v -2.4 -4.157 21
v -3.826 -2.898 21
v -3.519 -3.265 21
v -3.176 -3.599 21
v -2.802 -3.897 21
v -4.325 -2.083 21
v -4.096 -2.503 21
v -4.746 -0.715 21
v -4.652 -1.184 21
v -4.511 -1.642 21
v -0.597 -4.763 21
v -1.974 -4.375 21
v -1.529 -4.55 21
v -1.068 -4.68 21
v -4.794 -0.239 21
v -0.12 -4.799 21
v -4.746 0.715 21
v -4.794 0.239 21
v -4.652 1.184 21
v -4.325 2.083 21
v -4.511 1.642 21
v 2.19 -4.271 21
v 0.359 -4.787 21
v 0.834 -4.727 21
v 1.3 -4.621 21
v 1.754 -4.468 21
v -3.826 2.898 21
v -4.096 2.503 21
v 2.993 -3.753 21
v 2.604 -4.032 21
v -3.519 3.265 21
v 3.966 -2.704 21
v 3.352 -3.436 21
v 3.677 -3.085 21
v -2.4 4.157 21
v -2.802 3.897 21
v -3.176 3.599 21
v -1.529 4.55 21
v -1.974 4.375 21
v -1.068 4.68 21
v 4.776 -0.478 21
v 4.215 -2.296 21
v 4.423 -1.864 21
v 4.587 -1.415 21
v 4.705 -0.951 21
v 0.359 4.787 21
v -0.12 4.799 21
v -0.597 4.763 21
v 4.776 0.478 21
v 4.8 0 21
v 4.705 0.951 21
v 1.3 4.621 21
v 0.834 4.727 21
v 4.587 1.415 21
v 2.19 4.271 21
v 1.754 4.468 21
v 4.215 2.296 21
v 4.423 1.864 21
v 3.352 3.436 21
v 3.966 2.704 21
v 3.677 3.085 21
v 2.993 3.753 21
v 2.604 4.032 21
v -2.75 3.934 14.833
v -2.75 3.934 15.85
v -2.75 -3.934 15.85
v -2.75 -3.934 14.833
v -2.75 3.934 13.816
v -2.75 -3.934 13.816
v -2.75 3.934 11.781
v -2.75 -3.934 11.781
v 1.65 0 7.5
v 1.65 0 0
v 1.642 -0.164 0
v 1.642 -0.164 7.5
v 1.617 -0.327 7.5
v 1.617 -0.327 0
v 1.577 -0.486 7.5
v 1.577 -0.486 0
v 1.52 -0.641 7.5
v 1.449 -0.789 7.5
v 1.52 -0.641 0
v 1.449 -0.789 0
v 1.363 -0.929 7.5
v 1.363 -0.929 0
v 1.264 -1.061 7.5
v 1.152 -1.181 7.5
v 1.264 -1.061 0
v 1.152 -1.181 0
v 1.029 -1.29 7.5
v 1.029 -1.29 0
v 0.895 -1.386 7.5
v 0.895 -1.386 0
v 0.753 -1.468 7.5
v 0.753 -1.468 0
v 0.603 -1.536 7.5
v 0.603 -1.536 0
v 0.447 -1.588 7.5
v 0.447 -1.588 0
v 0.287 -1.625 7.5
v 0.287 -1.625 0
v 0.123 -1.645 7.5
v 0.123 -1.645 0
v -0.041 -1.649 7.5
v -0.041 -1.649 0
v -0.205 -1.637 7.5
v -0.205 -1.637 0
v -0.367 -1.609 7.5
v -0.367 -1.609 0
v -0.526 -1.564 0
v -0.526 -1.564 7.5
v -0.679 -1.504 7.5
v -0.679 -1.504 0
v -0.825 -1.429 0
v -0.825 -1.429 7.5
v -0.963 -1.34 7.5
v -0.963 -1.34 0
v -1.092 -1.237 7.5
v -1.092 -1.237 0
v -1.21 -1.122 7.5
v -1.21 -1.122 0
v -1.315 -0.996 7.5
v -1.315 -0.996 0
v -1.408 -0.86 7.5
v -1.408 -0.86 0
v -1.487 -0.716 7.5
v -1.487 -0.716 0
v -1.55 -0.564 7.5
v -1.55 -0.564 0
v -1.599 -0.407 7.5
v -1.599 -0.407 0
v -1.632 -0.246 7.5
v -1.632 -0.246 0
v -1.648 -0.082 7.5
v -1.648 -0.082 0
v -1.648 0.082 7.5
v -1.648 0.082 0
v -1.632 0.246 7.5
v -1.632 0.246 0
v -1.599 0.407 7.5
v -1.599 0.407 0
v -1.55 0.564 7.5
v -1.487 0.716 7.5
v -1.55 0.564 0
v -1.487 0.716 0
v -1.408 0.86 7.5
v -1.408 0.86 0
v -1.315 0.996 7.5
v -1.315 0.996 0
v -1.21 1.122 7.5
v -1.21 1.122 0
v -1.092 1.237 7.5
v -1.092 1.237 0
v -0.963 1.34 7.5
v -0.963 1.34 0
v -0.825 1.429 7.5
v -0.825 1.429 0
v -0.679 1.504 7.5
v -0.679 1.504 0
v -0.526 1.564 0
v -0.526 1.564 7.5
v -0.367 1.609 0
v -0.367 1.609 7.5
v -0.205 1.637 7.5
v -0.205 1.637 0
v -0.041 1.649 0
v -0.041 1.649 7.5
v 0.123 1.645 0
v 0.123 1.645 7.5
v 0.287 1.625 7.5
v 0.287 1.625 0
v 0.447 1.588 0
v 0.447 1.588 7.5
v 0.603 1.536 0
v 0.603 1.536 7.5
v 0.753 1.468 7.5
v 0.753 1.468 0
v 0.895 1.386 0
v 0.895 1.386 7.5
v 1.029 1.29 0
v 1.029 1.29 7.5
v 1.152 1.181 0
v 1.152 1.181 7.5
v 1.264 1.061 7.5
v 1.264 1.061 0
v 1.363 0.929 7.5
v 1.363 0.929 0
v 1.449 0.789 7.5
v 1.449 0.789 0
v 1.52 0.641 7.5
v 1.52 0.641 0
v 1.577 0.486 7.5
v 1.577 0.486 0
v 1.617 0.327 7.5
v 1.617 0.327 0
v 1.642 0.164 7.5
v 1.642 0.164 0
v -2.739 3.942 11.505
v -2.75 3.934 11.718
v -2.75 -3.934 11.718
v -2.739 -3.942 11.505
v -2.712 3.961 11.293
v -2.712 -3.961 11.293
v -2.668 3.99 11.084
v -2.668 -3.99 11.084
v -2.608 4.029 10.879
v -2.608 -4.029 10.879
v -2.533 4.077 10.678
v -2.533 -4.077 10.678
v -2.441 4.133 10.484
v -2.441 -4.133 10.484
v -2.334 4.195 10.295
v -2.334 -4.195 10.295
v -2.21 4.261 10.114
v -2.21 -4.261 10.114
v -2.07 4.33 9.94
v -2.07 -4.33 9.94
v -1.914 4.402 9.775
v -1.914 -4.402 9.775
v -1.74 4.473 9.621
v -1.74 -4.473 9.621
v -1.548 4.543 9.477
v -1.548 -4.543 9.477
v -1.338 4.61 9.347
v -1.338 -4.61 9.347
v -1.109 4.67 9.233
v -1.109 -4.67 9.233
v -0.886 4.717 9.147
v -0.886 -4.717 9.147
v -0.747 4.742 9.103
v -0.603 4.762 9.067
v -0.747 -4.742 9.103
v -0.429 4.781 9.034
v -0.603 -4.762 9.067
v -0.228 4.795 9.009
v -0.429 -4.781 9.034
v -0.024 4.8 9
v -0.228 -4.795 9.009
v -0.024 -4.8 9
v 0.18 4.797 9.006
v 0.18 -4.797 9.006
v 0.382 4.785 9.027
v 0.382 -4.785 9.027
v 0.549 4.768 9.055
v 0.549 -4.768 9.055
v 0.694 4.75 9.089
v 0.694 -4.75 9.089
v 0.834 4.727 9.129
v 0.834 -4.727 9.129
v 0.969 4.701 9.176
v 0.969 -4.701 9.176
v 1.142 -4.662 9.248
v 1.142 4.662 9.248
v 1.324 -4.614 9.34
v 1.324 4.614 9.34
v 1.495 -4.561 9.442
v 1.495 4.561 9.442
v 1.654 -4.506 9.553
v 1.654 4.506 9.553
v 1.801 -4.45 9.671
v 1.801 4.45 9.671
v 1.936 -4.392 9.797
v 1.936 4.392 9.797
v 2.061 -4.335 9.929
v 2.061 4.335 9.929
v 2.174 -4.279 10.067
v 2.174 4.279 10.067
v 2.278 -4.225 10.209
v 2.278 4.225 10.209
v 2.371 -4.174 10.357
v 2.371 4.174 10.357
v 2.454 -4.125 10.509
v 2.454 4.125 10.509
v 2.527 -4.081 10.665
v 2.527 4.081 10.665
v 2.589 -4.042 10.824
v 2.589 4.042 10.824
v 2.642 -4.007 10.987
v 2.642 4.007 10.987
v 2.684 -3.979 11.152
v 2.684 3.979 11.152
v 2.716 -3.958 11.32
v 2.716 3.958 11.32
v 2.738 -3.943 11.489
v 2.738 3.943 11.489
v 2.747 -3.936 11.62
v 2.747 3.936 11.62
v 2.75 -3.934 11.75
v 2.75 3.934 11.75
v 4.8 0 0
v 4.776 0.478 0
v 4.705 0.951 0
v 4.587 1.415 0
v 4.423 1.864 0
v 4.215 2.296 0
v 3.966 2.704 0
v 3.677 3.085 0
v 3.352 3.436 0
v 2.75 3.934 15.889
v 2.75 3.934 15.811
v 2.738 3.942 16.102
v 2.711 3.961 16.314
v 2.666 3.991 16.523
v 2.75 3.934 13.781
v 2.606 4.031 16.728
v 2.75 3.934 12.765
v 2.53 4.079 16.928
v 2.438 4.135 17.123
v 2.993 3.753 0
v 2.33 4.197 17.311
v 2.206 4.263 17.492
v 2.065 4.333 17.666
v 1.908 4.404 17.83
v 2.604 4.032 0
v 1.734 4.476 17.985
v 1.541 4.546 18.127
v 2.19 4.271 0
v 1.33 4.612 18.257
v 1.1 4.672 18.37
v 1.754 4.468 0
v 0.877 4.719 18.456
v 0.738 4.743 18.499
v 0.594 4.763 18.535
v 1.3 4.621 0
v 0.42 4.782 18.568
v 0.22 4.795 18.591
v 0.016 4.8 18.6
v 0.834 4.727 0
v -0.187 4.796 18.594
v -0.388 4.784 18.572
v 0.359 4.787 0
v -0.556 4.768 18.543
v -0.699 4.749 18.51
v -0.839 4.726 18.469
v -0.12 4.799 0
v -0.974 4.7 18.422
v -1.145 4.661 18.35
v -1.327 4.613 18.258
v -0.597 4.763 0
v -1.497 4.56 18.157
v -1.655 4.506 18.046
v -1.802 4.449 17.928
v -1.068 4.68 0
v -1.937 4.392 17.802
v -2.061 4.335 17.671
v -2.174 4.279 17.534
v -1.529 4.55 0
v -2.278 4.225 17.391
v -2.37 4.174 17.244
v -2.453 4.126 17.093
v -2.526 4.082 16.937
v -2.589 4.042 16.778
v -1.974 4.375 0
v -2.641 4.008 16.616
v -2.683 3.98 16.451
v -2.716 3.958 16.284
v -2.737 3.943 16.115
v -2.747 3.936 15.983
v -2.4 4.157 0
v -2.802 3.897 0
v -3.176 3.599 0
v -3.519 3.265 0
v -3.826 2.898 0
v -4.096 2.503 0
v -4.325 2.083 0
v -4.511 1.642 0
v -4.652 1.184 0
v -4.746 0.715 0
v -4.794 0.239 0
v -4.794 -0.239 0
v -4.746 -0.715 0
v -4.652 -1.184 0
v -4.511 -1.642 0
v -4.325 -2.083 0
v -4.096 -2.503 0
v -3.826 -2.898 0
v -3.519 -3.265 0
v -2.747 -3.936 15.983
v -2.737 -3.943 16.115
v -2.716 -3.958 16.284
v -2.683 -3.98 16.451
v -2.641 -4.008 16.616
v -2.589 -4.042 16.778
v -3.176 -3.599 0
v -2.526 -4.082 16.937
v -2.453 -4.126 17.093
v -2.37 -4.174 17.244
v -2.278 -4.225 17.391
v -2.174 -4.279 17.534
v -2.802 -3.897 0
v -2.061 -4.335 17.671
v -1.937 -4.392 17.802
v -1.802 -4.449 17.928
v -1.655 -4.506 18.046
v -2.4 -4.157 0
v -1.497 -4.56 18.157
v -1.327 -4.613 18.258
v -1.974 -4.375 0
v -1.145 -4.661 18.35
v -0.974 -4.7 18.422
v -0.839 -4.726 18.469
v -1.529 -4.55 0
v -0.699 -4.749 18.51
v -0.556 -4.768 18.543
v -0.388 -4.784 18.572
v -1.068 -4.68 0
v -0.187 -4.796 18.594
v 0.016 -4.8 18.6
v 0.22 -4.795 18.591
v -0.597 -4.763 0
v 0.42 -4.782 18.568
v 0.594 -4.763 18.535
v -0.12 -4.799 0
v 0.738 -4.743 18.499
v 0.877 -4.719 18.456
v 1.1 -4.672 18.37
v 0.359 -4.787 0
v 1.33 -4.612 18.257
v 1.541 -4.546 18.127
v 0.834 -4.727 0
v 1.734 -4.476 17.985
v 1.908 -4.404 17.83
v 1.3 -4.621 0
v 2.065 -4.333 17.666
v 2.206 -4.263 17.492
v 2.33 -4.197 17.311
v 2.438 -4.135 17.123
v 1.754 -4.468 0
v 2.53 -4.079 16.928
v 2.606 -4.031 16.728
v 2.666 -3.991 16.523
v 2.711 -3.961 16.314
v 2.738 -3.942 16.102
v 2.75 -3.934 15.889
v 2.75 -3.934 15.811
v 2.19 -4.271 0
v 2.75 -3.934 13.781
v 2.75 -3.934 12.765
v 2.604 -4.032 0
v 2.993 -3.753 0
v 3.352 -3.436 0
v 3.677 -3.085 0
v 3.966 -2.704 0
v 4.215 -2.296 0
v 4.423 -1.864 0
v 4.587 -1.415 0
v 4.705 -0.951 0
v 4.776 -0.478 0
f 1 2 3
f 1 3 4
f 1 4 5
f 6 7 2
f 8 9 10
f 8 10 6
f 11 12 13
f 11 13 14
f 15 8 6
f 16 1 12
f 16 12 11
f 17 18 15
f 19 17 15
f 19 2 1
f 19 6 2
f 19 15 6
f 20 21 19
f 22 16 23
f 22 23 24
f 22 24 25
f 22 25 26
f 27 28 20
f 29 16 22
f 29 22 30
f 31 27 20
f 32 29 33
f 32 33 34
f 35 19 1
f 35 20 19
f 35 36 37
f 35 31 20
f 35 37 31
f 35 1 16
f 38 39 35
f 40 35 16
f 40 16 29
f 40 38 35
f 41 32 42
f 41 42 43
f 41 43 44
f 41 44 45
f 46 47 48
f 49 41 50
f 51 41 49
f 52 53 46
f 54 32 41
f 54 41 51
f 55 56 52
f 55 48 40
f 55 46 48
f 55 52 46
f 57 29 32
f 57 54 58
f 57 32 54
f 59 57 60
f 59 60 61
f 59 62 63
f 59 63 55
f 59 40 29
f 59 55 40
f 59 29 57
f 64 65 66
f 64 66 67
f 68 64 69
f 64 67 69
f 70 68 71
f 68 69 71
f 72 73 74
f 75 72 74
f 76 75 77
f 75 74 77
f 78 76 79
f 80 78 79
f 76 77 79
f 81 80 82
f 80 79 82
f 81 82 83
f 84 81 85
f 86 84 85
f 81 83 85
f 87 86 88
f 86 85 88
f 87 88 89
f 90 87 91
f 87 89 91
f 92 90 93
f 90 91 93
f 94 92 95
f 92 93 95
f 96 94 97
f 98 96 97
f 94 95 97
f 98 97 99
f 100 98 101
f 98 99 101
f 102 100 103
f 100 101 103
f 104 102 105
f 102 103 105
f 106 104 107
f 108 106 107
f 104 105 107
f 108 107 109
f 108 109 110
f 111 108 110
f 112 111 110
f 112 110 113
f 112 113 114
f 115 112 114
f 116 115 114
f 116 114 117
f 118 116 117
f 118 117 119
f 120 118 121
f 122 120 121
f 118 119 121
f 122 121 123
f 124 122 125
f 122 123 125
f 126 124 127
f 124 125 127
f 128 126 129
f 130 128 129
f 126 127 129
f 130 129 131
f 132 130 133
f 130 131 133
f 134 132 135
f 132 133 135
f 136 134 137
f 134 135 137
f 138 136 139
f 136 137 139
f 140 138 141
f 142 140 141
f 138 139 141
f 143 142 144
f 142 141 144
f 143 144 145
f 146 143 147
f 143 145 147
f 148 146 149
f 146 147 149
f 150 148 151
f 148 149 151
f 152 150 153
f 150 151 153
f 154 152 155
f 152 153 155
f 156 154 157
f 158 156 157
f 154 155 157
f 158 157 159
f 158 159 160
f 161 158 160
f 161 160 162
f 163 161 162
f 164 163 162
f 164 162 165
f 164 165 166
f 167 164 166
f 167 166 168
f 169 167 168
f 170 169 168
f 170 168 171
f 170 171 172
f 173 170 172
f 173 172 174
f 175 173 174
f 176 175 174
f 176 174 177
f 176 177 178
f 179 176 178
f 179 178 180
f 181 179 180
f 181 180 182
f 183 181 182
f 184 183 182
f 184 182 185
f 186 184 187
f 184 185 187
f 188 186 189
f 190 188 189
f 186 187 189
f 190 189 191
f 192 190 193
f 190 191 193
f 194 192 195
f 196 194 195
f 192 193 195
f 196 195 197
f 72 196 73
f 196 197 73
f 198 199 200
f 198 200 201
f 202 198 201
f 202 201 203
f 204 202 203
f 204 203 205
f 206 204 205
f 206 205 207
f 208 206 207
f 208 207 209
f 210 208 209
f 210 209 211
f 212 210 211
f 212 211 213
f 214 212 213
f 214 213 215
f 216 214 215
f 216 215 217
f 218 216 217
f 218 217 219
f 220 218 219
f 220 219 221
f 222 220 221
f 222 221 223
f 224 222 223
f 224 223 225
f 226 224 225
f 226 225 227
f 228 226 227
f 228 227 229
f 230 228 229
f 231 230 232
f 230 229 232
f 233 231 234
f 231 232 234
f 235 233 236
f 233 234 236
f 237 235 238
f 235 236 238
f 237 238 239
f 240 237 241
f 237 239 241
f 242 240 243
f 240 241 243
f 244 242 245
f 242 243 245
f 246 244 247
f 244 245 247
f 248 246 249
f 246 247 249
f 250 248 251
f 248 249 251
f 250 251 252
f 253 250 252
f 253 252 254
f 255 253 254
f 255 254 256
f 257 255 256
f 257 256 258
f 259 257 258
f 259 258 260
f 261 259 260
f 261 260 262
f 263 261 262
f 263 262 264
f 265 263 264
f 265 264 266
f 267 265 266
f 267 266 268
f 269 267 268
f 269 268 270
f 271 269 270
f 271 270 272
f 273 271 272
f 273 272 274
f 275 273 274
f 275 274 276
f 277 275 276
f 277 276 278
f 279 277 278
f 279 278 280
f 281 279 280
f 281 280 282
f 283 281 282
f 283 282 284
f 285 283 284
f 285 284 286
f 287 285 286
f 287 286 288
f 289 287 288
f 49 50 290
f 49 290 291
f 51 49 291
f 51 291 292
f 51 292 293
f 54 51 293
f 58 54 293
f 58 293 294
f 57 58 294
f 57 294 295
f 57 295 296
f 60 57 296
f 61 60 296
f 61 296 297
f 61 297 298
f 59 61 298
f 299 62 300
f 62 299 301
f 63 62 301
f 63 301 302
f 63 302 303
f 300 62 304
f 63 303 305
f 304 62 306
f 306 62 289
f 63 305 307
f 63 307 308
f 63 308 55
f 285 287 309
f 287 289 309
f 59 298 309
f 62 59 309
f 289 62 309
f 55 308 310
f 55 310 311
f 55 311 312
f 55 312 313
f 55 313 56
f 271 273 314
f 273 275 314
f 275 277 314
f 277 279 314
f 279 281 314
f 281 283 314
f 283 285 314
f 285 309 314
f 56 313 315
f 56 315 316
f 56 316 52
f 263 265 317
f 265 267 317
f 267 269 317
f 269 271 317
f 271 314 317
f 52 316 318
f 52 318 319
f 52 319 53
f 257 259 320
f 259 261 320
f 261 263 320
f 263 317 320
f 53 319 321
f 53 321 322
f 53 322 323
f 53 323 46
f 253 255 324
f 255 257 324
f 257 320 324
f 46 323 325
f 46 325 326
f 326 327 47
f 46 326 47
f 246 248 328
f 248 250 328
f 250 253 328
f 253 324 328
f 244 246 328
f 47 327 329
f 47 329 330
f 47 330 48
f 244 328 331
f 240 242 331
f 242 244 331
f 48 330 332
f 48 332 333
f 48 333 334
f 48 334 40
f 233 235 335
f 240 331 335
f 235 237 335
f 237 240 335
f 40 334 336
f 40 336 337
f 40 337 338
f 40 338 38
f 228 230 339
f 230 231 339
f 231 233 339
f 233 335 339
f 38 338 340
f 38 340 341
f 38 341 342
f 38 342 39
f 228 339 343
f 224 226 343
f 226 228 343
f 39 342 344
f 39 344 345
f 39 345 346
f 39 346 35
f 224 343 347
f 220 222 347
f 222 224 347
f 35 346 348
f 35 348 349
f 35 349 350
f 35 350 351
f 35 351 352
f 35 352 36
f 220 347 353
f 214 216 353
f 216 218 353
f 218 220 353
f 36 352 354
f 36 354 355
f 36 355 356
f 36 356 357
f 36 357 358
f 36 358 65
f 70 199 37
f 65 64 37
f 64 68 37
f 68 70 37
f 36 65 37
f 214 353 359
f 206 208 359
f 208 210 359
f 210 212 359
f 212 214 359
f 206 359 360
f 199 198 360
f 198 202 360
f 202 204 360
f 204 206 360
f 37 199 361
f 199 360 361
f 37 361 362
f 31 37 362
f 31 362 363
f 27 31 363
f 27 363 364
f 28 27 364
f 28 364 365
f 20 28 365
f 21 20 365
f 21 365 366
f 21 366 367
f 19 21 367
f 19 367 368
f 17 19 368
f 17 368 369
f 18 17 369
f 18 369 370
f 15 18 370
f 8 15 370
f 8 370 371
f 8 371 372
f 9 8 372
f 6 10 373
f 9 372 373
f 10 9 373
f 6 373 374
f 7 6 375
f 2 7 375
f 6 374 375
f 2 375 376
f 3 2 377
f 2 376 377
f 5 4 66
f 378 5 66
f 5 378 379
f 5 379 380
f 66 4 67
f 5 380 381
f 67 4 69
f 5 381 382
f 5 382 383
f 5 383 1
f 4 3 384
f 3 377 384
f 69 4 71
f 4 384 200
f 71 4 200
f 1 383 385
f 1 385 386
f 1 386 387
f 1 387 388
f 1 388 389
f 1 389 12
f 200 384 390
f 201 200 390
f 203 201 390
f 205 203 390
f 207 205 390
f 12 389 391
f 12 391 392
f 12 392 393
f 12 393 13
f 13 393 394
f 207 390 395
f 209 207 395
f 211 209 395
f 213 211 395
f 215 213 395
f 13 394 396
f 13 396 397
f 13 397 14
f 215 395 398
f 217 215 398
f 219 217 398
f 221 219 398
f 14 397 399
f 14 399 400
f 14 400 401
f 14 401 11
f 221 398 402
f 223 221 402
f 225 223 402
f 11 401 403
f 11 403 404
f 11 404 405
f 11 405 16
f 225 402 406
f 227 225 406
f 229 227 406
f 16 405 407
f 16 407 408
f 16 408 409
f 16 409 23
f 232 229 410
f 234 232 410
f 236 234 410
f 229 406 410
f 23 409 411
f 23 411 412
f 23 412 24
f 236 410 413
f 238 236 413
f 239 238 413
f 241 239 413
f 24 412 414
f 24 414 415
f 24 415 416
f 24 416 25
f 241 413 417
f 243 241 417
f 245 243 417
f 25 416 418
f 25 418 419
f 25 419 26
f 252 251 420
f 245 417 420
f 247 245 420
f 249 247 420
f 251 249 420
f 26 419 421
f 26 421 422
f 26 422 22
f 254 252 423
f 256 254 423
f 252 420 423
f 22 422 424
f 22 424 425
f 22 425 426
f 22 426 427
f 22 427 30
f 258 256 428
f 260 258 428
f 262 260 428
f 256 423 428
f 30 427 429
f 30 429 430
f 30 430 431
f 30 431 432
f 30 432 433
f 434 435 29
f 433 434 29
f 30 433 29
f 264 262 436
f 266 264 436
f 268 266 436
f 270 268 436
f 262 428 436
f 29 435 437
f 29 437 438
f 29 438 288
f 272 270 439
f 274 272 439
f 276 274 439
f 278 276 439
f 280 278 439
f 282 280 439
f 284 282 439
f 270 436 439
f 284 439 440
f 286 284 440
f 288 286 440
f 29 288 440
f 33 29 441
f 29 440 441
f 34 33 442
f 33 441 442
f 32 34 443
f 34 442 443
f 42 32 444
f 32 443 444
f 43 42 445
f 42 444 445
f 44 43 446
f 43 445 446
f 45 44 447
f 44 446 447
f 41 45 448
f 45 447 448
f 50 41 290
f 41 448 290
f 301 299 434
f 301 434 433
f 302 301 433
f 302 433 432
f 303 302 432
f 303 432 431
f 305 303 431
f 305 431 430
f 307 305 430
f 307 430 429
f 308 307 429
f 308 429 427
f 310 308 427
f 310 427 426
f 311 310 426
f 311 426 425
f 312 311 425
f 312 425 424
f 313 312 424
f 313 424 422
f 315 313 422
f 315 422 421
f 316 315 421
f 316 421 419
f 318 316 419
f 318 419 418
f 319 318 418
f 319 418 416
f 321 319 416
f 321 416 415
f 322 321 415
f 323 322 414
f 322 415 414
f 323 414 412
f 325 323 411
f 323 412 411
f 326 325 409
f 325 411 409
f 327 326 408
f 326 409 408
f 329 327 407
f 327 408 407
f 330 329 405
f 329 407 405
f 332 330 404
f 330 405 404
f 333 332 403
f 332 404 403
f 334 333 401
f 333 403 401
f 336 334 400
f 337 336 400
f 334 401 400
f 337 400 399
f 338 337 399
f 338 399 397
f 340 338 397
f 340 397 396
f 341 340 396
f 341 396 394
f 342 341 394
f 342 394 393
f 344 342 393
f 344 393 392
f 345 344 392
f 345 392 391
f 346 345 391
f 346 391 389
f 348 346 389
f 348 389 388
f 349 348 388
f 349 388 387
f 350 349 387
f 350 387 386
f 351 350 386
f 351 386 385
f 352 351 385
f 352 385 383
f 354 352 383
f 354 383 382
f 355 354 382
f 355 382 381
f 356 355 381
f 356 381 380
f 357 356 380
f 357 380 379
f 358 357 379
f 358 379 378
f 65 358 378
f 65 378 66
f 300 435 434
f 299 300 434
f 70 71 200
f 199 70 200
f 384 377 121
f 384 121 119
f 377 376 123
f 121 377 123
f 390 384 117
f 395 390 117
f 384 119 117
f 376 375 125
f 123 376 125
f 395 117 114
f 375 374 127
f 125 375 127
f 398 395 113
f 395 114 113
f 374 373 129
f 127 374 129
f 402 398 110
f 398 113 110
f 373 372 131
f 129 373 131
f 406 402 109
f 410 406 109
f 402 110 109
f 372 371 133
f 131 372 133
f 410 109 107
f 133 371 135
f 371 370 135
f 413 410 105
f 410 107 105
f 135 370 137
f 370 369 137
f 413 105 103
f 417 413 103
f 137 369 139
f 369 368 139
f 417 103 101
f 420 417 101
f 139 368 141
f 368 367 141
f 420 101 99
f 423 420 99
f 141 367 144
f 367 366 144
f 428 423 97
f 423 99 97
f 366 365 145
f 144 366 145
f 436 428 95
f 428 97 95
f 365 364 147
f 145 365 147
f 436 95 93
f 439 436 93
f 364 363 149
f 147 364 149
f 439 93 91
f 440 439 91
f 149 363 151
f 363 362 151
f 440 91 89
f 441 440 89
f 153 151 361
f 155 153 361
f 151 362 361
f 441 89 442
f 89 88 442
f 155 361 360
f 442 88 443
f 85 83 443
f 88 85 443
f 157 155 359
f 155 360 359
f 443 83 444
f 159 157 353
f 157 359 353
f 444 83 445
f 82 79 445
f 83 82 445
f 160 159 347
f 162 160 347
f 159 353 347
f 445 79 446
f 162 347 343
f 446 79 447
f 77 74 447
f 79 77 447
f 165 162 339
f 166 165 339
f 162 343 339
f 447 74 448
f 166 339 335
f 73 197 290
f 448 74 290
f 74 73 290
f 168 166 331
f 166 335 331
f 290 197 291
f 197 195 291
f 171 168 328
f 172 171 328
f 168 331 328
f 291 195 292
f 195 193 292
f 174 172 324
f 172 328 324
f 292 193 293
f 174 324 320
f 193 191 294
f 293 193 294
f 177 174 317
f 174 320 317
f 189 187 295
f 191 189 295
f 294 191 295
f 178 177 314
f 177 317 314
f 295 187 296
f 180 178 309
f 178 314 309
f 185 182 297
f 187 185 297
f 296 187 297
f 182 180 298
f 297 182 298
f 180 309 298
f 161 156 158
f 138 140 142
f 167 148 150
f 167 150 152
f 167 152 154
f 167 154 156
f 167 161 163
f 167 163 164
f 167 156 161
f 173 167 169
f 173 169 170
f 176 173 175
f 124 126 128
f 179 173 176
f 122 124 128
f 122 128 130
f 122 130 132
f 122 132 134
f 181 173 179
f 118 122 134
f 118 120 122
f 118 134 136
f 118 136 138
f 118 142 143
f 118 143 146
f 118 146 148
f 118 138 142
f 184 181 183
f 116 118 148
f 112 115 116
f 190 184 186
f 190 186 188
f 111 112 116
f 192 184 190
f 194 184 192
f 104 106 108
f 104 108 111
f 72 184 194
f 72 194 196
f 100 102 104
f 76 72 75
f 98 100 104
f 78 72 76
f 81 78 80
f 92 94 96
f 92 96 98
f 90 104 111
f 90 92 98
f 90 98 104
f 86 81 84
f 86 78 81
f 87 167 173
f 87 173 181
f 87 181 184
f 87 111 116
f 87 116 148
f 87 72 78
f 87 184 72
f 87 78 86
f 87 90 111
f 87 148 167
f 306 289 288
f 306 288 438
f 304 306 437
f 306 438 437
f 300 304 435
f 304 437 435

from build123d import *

# Parameters (mm, degrees)
F0_R          = 4.8
F1_DEPTH      = 21
F2_R          = 1.65
F3_DEPTH      = 7.5
F5_DEPTH      = 4.8010001002
F5_DEPTH_BACK = 4.8010001002


with BuildPart() as f1:
    # F0 (on Top) → F1 (new body)
    with BuildSketch(Plane.XY):
        Circle(F0_R)
    extrude(amount=F1_DEPTH)

    # F2 (on face) → F3 (cut)
    with BuildSketch(Plane(origin=(0, 0, 0), x_dir=(1, 0, 0), z_dir=(0, 0, -1))):
        Circle(F2_R)
    extrude(amount=-F3_DEPTH, mode=Mode.SUBTRACT)

    # F4 (on Front) → F5 (cut, two sides)
    with BuildSketch(Plane.XZ) as f5_sk:
        with BuildLine():
            Line((2.7497246979, 15.8889112544), (2.7497298501, 15.8114545531))
            ThreePointArc((2.7497298501, 15.8114545531), (2.7499999939, 15.8501829219), (2.7497246979, 15.8889112544))
        make_face()
        with BuildLine():
            Line((2.7499999939, 11.7501829219), (2.7497298501, 15.8114545531))
            Line((2.7497298501, 15.8114545531), (2.7497246979, 15.8889112544))
            ThreePointArc((2.7497246979, 15.8889112544), (-0.0195165469, 18.5999307454), (-2.7499999973, 15.8498791315))
            Line((-2.7499999973, 15.8498791315), (-2.7498211771, 11.781360704))
            Line((-2.7498211771, 11.781360704), (-2.7498184098, 11.718397575))
            ThreePointArc((-2.7498184098, 11.718397575), (0.0158929328, 9.000045925), (2.7499999939, 11.7501829219))
        make_face()
        with BuildLine():
            ThreePointArc((-2.7498211771, 11.781360704), (-2.7499999973, 11.7498791315), (-2.7498184098, 11.718397575))
            Line((-2.7498184098, 11.718397575), (-2.7498211771, 11.781360704))
        make_face()
    extrude(amount=-F5_DEPTH, mode=Mode.SUBTRACT)
    extrude(f5_sk.sketch, amount=F5_DEPTH_BACK, mode=Mode.SUBTRACT)


solid = f1.part
